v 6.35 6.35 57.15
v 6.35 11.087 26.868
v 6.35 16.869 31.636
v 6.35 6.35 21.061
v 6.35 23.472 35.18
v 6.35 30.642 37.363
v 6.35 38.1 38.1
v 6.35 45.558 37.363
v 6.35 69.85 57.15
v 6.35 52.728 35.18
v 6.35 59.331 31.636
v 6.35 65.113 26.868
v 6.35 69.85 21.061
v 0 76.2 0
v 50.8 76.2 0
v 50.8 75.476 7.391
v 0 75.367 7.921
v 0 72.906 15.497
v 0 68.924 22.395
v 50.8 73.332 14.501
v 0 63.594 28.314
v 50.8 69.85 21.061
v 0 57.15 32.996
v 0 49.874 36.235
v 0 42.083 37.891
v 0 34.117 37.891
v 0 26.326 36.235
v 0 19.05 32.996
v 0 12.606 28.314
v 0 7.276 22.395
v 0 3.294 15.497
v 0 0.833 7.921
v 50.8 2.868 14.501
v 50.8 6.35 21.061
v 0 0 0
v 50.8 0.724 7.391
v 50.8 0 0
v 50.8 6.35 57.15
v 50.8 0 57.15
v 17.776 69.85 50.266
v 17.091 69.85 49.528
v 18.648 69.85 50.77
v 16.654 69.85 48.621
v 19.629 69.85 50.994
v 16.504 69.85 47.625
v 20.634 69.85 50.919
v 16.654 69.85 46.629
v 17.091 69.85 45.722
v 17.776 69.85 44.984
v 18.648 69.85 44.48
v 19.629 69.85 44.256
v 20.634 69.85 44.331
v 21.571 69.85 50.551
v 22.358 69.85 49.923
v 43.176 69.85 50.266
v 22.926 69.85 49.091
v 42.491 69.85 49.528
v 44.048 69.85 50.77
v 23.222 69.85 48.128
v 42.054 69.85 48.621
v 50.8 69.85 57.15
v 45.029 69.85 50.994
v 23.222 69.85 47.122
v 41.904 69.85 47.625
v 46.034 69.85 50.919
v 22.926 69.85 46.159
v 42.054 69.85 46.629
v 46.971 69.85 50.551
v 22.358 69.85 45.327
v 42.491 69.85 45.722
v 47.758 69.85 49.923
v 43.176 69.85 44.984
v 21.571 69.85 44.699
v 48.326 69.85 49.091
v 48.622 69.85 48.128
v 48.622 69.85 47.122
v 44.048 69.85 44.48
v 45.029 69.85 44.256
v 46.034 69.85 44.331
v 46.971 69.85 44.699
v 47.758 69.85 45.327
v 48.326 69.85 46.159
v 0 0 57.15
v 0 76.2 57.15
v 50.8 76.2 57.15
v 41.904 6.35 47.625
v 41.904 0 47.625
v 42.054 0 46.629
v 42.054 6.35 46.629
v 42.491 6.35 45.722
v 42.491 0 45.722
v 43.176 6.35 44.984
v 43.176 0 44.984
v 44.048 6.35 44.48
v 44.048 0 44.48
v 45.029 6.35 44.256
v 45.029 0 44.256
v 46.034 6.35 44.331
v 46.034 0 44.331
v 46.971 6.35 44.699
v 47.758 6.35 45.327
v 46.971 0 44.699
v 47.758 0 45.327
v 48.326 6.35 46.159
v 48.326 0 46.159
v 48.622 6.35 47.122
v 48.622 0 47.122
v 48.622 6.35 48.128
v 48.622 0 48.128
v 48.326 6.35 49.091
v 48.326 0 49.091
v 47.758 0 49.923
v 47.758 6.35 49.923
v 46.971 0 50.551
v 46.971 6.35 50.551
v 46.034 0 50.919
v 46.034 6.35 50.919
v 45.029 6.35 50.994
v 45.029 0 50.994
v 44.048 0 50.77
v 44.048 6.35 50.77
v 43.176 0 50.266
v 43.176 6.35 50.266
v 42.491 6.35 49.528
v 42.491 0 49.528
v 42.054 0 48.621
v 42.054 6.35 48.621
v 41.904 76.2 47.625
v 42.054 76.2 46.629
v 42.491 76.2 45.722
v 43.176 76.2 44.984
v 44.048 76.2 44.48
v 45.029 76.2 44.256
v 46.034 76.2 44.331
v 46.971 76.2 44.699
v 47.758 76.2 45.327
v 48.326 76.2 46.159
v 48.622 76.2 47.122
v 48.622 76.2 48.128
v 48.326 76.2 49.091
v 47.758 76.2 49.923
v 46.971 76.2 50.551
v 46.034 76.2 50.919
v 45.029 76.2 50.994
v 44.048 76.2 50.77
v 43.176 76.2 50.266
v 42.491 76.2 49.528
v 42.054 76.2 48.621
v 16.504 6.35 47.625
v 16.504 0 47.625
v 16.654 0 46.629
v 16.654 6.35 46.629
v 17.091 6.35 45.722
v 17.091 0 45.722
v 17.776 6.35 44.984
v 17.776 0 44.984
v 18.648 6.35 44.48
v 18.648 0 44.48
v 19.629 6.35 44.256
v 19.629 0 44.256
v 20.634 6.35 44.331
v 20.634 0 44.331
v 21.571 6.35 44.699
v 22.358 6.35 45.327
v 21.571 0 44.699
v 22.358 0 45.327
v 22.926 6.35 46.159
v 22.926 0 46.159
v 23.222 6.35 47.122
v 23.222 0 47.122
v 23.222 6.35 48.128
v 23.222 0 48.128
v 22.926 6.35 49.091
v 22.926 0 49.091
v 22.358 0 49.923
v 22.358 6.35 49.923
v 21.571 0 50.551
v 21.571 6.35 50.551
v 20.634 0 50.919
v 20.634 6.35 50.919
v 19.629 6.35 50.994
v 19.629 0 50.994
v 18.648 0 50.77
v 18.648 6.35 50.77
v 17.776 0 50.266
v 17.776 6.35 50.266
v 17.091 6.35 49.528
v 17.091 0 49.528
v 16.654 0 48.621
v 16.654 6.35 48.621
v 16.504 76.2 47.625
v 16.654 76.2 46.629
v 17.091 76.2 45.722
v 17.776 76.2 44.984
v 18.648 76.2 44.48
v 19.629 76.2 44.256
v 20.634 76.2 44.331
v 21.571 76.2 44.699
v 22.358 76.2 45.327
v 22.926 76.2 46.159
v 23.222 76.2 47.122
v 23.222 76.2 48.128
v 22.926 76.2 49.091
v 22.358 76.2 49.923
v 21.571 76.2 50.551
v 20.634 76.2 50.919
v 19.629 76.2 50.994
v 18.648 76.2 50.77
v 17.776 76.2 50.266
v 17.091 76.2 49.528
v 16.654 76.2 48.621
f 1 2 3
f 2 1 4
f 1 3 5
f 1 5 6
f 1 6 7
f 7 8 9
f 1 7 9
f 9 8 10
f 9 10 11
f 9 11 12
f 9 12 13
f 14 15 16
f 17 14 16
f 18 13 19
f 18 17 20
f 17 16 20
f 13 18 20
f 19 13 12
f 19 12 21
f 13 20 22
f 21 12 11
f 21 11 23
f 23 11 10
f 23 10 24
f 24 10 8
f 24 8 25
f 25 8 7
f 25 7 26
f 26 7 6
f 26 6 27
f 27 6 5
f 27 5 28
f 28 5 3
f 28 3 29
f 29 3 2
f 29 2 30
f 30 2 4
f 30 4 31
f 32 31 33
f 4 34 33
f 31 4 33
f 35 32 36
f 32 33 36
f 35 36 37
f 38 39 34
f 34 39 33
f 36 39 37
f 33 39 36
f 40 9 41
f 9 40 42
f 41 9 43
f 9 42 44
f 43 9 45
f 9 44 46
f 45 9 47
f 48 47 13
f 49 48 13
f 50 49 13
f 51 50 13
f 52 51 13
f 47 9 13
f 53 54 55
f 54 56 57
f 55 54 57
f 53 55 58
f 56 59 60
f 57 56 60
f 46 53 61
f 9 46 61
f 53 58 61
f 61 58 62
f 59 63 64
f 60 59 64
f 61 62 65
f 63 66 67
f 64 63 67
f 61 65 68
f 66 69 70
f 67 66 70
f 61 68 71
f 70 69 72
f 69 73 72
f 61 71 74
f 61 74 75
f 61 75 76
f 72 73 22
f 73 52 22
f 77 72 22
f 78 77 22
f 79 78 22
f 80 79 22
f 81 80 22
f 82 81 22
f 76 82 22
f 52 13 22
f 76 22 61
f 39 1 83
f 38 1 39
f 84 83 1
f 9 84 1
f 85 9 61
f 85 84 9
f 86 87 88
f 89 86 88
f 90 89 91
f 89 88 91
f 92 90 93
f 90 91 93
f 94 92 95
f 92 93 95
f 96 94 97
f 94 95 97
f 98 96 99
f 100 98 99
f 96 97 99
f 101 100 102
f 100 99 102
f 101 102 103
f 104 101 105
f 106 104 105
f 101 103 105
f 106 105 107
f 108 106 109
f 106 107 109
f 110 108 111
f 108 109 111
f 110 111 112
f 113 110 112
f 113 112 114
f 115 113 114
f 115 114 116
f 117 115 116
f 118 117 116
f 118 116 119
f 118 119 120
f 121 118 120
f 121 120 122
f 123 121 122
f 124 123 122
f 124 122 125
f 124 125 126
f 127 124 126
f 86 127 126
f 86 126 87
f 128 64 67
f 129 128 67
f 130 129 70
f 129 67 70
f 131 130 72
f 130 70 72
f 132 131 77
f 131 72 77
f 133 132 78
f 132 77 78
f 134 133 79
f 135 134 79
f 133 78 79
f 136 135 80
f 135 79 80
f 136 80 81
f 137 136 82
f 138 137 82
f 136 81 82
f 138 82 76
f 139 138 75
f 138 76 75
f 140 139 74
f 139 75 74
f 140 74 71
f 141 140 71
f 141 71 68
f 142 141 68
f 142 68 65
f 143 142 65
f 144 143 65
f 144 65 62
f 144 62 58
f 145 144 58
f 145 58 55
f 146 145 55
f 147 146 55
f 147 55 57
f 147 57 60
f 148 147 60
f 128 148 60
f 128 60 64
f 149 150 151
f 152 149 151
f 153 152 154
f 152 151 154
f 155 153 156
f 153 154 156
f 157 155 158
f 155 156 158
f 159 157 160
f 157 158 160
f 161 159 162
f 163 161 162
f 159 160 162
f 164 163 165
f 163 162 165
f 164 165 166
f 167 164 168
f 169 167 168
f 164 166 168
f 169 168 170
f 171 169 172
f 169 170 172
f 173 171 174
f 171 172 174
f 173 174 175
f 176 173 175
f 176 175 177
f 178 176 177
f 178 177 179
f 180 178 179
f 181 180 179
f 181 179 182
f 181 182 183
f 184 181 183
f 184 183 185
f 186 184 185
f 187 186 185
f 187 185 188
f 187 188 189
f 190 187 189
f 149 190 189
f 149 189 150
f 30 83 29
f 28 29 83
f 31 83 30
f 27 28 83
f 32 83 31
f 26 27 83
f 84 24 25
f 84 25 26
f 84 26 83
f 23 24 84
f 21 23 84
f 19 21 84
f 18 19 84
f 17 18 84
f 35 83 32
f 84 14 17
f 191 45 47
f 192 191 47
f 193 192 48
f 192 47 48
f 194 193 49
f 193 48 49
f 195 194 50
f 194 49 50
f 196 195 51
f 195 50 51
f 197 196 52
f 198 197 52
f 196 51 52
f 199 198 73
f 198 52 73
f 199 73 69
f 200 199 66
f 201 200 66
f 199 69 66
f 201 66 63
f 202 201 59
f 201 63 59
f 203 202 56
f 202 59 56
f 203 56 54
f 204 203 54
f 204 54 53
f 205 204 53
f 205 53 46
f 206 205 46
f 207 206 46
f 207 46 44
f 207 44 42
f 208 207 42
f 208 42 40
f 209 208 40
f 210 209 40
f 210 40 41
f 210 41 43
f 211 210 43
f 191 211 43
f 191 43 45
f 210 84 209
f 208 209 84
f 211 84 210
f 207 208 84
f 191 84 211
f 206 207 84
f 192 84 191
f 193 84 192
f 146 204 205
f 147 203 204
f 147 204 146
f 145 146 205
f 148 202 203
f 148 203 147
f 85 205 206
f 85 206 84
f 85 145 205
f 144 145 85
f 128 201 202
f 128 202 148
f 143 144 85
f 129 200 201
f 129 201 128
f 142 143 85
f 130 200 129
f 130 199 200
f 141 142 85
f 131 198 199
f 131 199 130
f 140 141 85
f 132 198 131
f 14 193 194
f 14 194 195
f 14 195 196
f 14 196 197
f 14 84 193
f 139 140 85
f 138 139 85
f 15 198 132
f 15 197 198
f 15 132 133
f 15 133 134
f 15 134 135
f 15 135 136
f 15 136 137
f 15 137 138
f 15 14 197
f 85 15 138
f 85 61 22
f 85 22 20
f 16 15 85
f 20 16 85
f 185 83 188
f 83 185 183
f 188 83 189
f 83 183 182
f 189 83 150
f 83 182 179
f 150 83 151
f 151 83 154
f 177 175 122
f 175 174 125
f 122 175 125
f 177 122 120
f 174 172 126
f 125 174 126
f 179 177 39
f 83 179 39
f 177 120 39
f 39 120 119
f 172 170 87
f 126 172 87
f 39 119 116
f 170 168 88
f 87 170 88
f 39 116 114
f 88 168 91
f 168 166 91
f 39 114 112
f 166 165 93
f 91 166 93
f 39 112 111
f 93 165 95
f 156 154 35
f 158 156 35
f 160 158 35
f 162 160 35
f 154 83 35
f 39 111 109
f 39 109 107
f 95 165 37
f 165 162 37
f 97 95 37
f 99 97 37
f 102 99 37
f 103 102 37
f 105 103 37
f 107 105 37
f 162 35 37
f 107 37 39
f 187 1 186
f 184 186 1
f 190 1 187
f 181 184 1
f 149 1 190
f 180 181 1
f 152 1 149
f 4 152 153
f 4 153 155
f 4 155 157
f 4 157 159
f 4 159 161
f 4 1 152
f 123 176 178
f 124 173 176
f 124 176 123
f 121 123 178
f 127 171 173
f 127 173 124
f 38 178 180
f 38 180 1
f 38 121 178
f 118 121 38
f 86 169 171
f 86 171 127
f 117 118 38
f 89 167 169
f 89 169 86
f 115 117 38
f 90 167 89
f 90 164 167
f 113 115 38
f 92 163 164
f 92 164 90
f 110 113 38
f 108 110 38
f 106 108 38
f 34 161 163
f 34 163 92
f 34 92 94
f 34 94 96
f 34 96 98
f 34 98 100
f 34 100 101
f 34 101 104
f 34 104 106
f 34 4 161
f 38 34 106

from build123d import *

# Parameters (mm, degrees)
SKETCH2_W               = 50.8
SKETCH2_H               = 76.2
BOSS_EXTRUDE2_DEPTH     = 57.15
SKETCH3_R               = 38.1
CUT_EXTRUDE1_DEPTH      = 108.95
SHELL1_T                = -6.35
F_1_4_CLEARANCE_HOLE1_D = 6.7564


with BuildPart() as part:
    # Sketch2 → Boss-Extrude2 (new body)
    with BuildSketch(Plane.XY):
        with Locations((25.4, 38.1)):
            Rectangle(SKETCH2_W, SKETCH2_H)
    extrude(amount=BOSS_EXTRUDE2_DEPTH)

    # Sketch3 → Cut-Extrude1 (cut, through all)
    with BuildSketch(Plane(origin=(50.8, 0, 0), x_dir=(0, 0, -1), z_dir=(1, 0, 0))):
        with Locations((0, 38.1)):
            Circle(SKETCH3_R)
    extrude(amount=-CUT_EXTRUDE1_DEPTH, mode=Mode.SUBTRACT)

    # Shell1
    shell1_openings = [part.faces().sort_by_distance(p)[0] for p in [
        (25.4, 38.1, 57.15),
        (25.4, 38.1, 38.1),
        (50.8, 38.1, 42.20881959),
    ]]
    offset(amount=SHELL1_T, openings=shell1_openings, kind=Kind.INTERSECTION)

    # 1/4 Clearance Hole1 (through all)
    with Locations(Plane(origin=(0, 76.2, 0), x_dir=(1, 0, 0), z_dir=(0, 1, 0))):
        with Locations((45.28185, -47.625), (19.88185, -47.625)):
            Hole(F_1_4_CLEARANCE_HOLE1_D / 2)


solid = part.part
